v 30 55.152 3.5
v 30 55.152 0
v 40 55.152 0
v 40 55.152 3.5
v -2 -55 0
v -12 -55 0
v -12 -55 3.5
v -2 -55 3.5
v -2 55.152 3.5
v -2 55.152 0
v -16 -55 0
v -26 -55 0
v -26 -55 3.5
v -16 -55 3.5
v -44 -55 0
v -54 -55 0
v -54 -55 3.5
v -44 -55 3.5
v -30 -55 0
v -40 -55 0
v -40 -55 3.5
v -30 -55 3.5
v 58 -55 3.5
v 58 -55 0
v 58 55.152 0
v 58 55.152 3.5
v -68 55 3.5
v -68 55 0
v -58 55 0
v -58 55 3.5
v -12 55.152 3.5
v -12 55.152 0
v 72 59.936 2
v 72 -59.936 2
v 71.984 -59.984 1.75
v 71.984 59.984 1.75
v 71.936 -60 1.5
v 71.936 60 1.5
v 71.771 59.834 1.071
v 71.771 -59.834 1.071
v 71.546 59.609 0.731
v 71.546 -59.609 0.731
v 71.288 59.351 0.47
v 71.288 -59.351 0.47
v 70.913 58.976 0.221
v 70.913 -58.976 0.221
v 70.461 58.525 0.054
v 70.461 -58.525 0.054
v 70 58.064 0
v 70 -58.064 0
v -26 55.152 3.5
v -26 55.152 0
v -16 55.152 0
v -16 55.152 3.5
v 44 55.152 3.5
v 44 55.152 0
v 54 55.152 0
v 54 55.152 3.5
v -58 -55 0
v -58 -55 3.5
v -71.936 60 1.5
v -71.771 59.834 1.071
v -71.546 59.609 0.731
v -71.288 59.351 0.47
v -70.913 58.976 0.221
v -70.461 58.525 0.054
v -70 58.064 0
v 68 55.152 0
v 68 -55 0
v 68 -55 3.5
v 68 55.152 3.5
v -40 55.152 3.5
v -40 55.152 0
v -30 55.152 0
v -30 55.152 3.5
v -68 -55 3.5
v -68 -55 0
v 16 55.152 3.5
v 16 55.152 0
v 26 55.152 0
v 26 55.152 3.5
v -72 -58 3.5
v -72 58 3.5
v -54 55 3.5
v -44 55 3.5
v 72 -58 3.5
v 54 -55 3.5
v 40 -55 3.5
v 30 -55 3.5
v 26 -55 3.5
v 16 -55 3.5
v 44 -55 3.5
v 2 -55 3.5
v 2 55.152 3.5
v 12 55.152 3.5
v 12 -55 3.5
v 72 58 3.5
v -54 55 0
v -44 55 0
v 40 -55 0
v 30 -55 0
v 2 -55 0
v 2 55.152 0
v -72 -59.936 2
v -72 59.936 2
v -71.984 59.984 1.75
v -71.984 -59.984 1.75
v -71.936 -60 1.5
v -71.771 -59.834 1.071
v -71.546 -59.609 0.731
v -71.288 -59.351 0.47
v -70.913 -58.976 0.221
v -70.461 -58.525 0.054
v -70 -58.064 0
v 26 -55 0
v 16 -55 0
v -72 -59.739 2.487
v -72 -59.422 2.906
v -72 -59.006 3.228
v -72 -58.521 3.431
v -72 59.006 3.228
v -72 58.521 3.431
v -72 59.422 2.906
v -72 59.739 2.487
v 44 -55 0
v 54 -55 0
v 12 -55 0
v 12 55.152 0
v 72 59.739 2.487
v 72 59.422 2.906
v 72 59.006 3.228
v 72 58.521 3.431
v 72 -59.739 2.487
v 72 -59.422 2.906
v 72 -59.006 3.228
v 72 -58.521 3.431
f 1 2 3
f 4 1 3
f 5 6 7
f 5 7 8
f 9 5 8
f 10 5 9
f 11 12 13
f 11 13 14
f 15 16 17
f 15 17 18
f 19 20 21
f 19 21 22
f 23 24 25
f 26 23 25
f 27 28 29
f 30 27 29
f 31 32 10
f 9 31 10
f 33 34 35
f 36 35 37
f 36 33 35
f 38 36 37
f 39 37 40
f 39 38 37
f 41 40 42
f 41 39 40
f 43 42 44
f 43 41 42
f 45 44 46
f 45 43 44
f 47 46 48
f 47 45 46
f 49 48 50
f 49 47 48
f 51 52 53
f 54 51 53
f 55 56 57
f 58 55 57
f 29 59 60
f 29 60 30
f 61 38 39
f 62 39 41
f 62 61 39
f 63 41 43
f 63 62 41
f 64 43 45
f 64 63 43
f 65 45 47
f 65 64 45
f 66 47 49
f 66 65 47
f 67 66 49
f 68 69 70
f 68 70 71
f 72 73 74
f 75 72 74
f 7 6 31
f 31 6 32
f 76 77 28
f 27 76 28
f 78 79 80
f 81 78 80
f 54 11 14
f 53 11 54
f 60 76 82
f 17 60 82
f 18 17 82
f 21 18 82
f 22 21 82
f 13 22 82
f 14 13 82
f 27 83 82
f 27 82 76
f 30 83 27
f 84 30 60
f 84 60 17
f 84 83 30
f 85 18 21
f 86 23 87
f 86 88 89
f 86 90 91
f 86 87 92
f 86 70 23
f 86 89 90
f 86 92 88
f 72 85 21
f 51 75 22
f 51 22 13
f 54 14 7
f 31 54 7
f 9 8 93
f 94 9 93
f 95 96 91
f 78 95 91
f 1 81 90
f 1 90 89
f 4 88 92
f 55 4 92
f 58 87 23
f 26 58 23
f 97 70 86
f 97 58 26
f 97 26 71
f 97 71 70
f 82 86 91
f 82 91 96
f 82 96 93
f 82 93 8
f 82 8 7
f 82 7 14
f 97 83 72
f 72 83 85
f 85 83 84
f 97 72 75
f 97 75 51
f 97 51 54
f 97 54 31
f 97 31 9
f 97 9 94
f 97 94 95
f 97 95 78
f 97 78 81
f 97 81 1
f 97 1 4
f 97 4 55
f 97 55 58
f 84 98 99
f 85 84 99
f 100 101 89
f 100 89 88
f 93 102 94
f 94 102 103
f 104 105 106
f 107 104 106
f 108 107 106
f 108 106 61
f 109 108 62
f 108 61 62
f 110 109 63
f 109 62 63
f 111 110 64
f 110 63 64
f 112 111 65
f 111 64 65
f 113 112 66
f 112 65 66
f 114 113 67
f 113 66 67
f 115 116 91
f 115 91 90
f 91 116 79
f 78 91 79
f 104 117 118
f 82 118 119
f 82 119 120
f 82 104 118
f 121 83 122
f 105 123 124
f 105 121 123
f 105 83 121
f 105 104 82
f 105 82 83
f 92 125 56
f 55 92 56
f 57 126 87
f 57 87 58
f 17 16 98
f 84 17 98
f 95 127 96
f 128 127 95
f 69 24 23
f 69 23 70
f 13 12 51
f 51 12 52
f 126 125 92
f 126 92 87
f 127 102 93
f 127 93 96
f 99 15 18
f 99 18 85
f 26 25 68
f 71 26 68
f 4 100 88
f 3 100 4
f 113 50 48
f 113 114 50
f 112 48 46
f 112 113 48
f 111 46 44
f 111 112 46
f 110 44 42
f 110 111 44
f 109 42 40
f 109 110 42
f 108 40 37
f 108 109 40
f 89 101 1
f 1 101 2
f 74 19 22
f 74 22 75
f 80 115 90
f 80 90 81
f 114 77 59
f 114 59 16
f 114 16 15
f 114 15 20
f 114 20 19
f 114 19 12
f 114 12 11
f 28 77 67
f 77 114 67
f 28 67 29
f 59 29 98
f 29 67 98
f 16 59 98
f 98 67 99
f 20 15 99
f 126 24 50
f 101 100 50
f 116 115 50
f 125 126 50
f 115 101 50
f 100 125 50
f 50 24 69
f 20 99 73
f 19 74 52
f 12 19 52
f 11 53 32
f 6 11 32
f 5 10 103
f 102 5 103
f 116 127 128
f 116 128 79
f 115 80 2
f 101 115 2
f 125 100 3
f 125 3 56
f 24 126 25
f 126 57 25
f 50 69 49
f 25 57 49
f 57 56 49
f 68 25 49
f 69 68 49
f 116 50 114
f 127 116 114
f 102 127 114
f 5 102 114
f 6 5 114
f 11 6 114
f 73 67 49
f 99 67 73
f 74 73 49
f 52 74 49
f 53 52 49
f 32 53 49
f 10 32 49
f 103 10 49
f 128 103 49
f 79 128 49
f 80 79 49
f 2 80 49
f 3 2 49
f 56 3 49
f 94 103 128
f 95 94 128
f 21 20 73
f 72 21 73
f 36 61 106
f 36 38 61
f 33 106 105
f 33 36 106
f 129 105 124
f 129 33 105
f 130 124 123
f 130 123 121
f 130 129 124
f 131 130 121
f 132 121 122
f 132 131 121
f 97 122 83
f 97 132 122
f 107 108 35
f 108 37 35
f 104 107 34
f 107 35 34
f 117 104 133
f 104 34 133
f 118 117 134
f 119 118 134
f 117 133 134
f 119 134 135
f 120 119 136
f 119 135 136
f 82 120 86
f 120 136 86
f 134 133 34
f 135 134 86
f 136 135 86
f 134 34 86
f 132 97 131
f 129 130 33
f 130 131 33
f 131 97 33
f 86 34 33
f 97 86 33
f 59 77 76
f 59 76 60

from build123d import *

# Parameters (mm, degrees)
F0_W        = 144
F0_H        = 120
F0_W_2      = 10
F0_H_2      = 110
F0_H_3      = 110.1521776617
F0_H_4      = 110.1521739364
F1_DEPTH    = 3.5
F2_R        = 2
F3_T1_DEPTH = 153.6824583655
F4_T1_DEPTH = 126.1270166538


# Not quite as in the source:
# - a fillet or chamfer that OpenCascade refuses, or shapes differently, is made with other operations: its cross-section is extruded or revolved along the edge and cut away or added


with BuildPart() as f1:
    # F0 (on Top) → F1 (new body)
    with BuildSketch(Plane.XY):
        Rectangle(F0_W, F0_H)
        with Locations((-63, 0)):
            Rectangle(F0_W_2, F0_H_2, mode=Mode.SUBTRACT)
        with Locations((-49, 0)):
            Rectangle(F0_W_2, F0_H_2, mode=Mode.SUBTRACT)
        with Locations((-35, 0.0760888308)):
            Rectangle(F0_W_2, F0_H_3, mode=Mode.SUBTRACT)
        with Locations((-21, 0.0760869682)):
            Rectangle(F0_W_2, F0_H_4, mode=Mode.SUBTRACT)
        with Locations((-7, 0.0760869682)):
            Rectangle(F0_W_2, F0_H_4, mode=Mode.SUBTRACT)
        with Locations((7, 0.0760869682)):
            Rectangle(F0_W_2, F0_H_4, mode=Mode.SUBTRACT)
        with Locations((21, 0.0760888308)):
            Rectangle(F0_W_2, F0_H_3, mode=Mode.SUBTRACT)
        with Locations((35, 0.0760869682)):
            Rectangle(F0_W_2, F0_H_4, mode=Mode.SUBTRACT)
        with Locations((49, 0.0760888308)):
            Rectangle(F0_W_2, F0_H_3, mode=Mode.SUBTRACT)
        with Locations((63, 0.0760888308)):
            Rectangle(F0_W_2, F0_H_3, mode=Mode.SUBTRACT)
    extrude(amount=F1_DEPTH)

    # F2
    f2_edges = [f1.edges().sort_by_distance(p)[0] for p in [
        (0, 60, 3.5),
        (0, -60, 3.5),
    ]]
    fillet(f2_edges, radius=F2_R)

    # F3: fillet of radius 2 on 2 edges, made by hand

    # F3_s2 → F3_t1 (cut)
    with BuildSketch(Plane.YZ.offset(-76.8412291828)):
        with BuildLine():
            ThreePointArc((-58.0635083269, 0), (-59.2882531983, 0.4188611699), (-60, 1.5))
            Line((-60, 1.5), (-60, 0))
            Line((-60, 0), (-58.0635083269, 0))
        make_face()
        with BuildLine():
            ThreePointArc((60, 1.5), (59.2882531983, 0.4188611699), (58.0635083269, 0))
            Line((58.0635083269, 0), (60, 0))
            Line((60, 0), (60, 1.5))
        make_face()
    extrude(amount=F3_T1_DEPTH, mode=Mode.SUBTRACT)

    # F4: fillet of radius 2 on 2 edges, made by hand

    # F4_s2 → F4_t1 (cut)
    with BuildSketch(Plane.XZ.offset(-63.0635083269)):
        with BuildLine():
            ThreePointArc((-72, 2), (-71.4142135624, 0.5857864376), (-70, 0))
            Line((-70, 0), (-72, 0))
            Line((-72, 0), (-72, 2))
        make_face()
        with BuildLine():
            ThreePointArc((72, 2), (71.4142135624, 0.5857864376), (70, 0))
            Line((70, 0), (72, 0))
            Line((72, 0), (72, 2))
        make_face()
    extrude(amount=F4_T1_DEPTH, mode=Mode.SUBTRACT)


solid = f1.part
